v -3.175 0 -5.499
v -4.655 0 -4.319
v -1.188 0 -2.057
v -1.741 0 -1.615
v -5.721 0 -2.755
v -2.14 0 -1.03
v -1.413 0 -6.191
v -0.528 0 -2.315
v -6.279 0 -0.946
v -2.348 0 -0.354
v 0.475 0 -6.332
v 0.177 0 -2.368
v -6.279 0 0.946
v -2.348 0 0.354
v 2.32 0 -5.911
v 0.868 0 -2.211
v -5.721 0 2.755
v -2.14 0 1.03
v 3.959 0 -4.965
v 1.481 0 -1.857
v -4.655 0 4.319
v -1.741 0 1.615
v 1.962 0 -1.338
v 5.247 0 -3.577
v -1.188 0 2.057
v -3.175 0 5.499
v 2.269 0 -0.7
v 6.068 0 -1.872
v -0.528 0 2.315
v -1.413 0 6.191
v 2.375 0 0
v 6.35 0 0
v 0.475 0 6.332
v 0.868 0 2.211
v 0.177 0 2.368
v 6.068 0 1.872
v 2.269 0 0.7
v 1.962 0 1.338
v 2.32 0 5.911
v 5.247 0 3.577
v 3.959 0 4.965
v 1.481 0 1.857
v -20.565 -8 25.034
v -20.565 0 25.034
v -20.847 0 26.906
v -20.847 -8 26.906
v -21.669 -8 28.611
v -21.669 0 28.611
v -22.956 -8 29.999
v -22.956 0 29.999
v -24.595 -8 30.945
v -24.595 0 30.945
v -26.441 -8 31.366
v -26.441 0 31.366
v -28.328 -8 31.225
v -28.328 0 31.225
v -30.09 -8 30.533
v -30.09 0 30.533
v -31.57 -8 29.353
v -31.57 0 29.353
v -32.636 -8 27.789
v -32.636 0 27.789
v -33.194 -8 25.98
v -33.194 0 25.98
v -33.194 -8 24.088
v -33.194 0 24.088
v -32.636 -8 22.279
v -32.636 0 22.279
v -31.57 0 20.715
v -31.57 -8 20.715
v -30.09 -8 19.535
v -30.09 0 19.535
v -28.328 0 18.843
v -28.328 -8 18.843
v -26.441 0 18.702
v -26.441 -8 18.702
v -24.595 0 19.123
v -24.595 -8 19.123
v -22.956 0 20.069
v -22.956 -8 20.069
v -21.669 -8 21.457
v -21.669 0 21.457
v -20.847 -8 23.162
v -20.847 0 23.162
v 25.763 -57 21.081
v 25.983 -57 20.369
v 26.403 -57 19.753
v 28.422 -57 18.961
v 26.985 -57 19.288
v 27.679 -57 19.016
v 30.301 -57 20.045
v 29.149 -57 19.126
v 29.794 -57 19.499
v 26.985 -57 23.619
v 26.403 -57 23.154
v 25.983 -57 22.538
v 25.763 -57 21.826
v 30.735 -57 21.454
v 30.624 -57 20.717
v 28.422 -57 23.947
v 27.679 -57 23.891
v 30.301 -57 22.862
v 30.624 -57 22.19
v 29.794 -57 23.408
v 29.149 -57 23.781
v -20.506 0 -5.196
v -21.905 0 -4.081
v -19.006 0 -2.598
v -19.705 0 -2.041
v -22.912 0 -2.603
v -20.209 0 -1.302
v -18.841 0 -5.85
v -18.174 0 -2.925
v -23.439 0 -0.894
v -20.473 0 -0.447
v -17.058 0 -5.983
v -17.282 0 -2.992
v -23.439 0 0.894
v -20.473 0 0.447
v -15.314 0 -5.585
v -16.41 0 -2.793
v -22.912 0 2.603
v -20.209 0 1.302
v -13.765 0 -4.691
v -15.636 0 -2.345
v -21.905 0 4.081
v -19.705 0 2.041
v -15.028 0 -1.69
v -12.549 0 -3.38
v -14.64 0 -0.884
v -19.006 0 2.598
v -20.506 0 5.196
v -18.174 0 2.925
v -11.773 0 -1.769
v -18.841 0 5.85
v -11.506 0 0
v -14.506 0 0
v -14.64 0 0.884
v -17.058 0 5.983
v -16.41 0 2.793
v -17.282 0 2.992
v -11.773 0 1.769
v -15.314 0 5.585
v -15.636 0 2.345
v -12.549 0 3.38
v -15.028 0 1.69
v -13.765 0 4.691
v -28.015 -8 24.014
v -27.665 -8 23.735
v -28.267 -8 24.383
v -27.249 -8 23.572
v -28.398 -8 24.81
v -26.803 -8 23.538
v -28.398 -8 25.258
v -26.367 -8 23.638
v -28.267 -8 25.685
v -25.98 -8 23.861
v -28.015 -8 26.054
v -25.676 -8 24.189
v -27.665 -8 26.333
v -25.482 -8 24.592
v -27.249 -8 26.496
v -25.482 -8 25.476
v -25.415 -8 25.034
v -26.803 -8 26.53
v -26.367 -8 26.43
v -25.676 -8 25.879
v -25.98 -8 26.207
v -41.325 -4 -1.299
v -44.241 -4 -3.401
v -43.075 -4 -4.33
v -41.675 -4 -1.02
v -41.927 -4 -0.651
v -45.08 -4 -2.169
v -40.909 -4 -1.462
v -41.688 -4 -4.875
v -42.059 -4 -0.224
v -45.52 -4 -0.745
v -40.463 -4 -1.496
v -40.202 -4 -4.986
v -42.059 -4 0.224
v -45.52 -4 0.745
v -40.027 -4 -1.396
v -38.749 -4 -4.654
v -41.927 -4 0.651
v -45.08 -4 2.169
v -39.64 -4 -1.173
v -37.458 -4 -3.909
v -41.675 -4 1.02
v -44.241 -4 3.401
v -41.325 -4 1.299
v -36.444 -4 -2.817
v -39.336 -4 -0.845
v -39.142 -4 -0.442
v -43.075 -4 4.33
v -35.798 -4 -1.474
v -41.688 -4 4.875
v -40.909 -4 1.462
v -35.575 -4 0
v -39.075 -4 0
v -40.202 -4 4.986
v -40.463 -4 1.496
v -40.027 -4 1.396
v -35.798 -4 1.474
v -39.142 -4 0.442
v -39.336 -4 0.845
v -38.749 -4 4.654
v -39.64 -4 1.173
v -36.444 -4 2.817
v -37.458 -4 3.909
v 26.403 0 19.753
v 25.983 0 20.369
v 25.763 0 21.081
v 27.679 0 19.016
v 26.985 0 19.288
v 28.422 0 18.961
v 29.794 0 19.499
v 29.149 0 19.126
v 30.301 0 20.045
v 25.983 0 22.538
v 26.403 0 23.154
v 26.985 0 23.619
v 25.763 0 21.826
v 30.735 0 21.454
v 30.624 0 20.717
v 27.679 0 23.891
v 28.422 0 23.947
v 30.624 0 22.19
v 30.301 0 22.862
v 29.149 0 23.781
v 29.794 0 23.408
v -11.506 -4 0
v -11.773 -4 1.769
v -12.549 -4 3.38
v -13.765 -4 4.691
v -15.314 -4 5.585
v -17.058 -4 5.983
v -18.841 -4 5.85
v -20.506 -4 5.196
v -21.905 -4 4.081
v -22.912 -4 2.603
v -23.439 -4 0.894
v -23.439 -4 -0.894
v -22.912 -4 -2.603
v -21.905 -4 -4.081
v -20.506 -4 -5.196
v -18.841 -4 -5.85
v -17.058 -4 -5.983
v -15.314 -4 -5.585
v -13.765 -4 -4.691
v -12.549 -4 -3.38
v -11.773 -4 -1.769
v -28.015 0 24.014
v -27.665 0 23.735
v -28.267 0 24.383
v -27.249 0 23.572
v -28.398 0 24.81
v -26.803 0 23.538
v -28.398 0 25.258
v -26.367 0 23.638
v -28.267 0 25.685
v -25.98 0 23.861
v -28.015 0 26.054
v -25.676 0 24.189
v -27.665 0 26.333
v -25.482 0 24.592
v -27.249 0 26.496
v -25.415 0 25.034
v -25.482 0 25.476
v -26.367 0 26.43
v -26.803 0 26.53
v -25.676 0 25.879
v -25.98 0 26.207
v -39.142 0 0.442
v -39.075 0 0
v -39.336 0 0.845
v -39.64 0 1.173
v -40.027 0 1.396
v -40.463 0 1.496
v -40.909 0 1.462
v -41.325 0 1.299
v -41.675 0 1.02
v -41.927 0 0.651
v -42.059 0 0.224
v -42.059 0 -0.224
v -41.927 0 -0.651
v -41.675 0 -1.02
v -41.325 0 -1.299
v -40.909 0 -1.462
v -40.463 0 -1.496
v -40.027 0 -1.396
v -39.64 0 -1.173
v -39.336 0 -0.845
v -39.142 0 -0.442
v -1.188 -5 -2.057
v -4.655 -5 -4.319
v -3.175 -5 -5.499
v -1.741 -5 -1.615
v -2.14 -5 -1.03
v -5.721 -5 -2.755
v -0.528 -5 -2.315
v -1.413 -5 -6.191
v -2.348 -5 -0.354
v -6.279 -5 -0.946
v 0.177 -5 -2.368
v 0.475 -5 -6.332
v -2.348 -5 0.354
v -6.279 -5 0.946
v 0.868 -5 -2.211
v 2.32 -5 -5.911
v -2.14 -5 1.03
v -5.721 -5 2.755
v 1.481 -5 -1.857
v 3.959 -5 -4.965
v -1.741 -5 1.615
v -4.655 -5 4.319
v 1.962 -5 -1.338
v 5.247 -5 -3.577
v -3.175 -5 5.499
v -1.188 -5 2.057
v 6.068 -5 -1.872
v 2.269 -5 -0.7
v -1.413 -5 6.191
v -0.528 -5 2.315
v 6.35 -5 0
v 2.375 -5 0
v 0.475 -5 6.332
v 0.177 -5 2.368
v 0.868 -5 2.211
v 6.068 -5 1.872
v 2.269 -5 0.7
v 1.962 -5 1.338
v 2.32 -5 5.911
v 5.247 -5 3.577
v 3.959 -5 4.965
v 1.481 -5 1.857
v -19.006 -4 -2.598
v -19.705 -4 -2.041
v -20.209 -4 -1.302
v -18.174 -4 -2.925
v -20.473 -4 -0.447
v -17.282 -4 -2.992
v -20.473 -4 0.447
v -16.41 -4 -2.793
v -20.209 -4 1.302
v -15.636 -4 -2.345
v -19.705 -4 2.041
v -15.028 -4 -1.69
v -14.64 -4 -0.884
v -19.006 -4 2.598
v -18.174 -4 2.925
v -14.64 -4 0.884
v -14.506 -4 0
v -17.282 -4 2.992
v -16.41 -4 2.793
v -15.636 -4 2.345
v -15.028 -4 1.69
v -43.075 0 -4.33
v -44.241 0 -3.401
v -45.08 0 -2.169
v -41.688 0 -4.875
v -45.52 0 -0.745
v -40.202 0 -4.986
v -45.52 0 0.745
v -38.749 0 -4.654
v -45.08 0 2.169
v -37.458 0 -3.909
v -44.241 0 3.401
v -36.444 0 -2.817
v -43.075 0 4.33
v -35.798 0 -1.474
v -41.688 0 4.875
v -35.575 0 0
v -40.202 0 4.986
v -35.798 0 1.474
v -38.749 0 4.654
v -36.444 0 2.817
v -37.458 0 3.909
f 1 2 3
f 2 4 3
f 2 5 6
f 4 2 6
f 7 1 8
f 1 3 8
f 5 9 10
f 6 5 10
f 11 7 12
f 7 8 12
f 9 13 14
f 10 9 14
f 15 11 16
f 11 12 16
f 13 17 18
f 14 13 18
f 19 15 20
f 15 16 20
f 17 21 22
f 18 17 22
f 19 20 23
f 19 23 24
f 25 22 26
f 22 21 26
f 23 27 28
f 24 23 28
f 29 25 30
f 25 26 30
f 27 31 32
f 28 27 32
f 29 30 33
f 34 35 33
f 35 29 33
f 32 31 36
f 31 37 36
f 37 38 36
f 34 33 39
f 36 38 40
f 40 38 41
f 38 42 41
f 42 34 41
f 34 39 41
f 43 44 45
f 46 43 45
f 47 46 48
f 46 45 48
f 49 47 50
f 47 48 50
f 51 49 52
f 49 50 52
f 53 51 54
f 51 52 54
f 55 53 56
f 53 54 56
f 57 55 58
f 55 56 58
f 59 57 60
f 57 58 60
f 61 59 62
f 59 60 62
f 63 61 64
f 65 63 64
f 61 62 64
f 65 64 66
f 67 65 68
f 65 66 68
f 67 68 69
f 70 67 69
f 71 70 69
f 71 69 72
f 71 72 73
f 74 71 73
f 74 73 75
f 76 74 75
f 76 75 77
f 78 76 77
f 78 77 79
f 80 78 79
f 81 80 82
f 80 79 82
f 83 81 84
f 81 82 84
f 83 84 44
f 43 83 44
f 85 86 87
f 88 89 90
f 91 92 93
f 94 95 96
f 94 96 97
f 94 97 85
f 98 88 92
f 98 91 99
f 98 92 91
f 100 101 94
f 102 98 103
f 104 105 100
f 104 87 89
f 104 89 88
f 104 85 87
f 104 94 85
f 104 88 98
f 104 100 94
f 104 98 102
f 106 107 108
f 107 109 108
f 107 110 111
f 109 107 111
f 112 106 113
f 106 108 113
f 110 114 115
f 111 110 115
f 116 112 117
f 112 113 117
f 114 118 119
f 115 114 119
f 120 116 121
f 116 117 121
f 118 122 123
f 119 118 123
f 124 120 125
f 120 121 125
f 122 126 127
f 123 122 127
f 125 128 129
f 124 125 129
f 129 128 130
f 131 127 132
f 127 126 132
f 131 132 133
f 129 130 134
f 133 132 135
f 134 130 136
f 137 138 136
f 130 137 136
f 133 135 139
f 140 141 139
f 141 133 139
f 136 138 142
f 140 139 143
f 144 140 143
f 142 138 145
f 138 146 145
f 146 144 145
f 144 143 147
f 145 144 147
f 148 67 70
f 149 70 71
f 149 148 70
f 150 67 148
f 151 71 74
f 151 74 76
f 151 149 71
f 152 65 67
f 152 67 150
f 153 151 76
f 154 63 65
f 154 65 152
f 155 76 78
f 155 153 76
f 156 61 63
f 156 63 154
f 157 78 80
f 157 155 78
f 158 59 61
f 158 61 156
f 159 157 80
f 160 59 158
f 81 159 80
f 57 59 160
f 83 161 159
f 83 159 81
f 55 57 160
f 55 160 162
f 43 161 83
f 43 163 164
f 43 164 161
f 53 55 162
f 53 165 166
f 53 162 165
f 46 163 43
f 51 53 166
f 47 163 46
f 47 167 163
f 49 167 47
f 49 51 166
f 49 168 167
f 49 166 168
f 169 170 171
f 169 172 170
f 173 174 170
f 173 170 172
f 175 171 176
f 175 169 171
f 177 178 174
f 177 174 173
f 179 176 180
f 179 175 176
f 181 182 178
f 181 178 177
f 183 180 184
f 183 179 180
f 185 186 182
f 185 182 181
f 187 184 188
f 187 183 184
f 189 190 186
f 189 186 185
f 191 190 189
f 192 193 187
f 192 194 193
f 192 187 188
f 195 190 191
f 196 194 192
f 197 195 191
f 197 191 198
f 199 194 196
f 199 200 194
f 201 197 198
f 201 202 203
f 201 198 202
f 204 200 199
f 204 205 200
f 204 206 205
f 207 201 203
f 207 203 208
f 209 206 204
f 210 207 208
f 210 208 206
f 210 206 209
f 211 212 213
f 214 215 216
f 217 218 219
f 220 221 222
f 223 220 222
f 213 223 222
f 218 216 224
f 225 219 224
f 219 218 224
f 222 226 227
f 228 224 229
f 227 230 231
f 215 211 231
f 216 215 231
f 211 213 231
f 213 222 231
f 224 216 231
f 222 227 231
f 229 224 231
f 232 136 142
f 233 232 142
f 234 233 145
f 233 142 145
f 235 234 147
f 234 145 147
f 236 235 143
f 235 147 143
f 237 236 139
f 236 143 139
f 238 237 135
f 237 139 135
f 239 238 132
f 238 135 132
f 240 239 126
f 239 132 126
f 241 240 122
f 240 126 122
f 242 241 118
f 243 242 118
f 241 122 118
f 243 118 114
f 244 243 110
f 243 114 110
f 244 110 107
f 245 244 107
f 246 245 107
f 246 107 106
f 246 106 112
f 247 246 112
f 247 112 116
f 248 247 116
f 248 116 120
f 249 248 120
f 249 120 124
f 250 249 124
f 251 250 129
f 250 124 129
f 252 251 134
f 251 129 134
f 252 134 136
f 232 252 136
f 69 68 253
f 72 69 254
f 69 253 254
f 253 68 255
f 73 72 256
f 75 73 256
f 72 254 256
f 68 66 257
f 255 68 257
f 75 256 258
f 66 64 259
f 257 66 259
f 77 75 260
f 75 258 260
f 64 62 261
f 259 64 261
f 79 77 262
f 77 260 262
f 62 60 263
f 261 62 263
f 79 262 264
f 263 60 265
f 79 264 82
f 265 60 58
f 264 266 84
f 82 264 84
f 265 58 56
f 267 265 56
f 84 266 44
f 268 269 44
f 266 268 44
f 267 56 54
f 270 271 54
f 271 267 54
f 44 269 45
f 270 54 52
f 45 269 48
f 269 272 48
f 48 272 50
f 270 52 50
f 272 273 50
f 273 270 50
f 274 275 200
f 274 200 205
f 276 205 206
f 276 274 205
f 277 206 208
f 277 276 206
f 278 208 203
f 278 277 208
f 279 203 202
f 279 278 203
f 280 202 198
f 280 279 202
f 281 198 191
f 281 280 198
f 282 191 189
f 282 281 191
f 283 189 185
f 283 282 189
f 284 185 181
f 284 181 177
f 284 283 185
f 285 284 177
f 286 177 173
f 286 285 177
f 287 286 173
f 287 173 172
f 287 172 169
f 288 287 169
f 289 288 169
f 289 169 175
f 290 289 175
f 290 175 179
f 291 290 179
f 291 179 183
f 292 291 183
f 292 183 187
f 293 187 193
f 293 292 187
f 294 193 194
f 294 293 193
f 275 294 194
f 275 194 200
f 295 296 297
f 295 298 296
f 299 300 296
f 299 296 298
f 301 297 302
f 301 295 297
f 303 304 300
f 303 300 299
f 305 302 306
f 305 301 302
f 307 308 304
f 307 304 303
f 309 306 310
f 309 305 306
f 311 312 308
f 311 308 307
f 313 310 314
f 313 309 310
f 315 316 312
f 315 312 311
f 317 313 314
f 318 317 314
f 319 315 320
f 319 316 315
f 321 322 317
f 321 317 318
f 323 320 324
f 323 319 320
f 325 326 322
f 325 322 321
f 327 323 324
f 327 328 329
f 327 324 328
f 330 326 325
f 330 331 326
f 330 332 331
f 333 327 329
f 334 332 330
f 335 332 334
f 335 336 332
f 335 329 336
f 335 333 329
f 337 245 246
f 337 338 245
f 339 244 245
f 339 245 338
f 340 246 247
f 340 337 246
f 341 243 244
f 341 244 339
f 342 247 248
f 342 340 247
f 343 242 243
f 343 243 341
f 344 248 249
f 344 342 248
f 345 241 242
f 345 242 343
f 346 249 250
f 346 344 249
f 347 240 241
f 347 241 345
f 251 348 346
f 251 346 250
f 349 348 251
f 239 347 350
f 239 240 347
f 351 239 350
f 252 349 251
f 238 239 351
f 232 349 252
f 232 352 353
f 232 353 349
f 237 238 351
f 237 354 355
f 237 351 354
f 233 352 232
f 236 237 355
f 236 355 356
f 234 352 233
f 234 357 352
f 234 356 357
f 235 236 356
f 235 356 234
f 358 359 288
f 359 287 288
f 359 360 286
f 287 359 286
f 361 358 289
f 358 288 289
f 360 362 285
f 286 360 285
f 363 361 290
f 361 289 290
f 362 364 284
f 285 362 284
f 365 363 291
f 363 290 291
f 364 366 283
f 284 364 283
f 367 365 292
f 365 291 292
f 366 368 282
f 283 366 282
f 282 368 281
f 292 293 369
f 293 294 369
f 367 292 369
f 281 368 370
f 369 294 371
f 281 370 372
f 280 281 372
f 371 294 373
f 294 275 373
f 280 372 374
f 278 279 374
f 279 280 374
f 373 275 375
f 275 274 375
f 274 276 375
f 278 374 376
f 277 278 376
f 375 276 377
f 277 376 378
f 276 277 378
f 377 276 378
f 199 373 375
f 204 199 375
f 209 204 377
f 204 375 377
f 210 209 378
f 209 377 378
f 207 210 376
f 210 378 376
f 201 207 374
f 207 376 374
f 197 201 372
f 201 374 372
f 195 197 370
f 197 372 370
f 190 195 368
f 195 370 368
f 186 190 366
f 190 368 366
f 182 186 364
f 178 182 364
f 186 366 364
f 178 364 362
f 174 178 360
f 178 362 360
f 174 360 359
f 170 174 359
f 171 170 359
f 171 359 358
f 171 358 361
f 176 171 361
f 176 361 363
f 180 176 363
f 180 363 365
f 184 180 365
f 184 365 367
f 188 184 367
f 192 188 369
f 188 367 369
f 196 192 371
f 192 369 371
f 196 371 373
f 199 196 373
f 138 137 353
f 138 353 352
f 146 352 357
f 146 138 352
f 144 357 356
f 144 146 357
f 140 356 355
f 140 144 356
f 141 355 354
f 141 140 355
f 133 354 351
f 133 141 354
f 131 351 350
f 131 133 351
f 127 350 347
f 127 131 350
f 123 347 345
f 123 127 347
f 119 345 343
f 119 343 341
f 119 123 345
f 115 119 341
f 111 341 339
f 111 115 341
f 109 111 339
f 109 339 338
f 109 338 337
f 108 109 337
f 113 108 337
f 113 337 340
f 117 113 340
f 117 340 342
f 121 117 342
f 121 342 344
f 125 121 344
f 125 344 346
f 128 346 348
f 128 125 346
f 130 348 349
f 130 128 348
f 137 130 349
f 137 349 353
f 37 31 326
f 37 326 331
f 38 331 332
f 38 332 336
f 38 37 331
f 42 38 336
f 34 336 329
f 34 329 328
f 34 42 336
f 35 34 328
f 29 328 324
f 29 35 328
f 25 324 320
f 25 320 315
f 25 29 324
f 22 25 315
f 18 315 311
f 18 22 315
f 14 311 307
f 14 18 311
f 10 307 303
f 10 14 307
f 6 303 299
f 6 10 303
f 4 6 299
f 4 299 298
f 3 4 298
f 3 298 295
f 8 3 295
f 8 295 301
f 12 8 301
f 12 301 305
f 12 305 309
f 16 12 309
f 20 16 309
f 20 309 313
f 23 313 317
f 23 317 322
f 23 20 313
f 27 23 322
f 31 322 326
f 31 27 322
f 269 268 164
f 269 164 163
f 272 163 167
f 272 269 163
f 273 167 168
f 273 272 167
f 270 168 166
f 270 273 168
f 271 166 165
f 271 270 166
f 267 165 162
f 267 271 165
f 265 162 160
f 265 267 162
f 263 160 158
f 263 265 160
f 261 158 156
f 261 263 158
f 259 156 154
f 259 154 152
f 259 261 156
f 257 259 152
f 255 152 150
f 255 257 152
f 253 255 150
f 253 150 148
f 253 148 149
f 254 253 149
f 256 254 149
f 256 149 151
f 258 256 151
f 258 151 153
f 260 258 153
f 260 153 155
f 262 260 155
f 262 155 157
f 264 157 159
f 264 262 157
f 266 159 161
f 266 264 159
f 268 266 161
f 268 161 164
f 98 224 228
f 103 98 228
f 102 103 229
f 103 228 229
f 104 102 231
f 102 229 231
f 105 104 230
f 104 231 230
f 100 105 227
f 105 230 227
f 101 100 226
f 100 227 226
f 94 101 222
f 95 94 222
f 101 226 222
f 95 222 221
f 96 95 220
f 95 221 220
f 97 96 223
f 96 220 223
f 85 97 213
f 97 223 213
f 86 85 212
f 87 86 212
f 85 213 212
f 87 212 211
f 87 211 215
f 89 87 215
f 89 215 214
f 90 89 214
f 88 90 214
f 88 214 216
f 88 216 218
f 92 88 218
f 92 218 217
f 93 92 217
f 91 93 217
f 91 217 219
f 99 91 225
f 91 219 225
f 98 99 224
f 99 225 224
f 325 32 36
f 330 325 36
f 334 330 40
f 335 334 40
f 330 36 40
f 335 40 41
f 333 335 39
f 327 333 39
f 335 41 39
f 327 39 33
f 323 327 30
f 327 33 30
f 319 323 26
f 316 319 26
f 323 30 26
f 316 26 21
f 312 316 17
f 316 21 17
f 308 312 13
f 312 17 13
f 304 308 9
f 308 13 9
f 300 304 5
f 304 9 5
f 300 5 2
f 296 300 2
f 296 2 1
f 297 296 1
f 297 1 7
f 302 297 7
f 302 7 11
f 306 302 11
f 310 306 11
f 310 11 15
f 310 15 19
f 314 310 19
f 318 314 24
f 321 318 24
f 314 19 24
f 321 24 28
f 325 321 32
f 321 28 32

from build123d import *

# Parameters (mm, degrees)
F0_R     = 6.35
F0_R_2   = 2.375
F1_DEPTH = 5
F2_R     = 2.5
F3_DEPTH = 57
F4_R     = 5
F4_R_2   = 1.5
F5_DEPTH = 4
F6_R     = 6
F6_R_2   = 3
F7_DEPTH = 4
F8_R     = 6.35
F8_R_2   = 1.5
F9_DEPTH = 8


with BuildPart() as f1:
    # F0 (on Front) → F1 (new body)
    with BuildSketch(Plane.XZ):
        Circle(F0_R)
        Circle(F0_R_2, mode=Mode.SUBTRACT)
    extrude(amount=F1_DEPTH)


with BuildPart() as f3:
    # F2 (on Front) → F3 (new body)
    with BuildSketch(Plane.XZ):
        with Locations((28.235165, 21.453524)):
            Circle(F2_R)
    extrude(amount=F3_DEPTH)


with BuildPart() as f5:
    # F4 (on Front) → F5 (new body)
    with BuildSketch(Plane.XZ):
        with Locations((-40.575489, 0)):
            Circle(F4_R)
        with Locations((-40.575489, 0)):
            Circle(F4_R_2, mode=Mode.SUBTRACT)
    extrude(amount=F5_DEPTH)


with BuildPart() as f7:
    # F6 (on Front) → F7 (new body)
    with BuildSketch(Plane.XZ):
        with Locations((-17.506289, 0)):
            Circle(F6_R)
        with Locations((-17.506289, 0)):
            Circle(F6_R_2, mode=Mode.SUBTRACT)
    extrude(amount=F7_DEPTH)


with BuildPart() as f9:
    # F8 (on Front) → F9 (new body)
    with BuildSketch(Plane.XZ):
        with Locations((-26.915228, 25.034055)):
            Circle(F8_R)
        with Locations((-26.915228, 25.034055)):
            Circle(F8_R_2, mode=Mode.SUBTRACT)
    extrude(amount=F9_DEPTH)


solid = Compound([f1.part, f3.part, f5.part, f7.part, f9.part])
